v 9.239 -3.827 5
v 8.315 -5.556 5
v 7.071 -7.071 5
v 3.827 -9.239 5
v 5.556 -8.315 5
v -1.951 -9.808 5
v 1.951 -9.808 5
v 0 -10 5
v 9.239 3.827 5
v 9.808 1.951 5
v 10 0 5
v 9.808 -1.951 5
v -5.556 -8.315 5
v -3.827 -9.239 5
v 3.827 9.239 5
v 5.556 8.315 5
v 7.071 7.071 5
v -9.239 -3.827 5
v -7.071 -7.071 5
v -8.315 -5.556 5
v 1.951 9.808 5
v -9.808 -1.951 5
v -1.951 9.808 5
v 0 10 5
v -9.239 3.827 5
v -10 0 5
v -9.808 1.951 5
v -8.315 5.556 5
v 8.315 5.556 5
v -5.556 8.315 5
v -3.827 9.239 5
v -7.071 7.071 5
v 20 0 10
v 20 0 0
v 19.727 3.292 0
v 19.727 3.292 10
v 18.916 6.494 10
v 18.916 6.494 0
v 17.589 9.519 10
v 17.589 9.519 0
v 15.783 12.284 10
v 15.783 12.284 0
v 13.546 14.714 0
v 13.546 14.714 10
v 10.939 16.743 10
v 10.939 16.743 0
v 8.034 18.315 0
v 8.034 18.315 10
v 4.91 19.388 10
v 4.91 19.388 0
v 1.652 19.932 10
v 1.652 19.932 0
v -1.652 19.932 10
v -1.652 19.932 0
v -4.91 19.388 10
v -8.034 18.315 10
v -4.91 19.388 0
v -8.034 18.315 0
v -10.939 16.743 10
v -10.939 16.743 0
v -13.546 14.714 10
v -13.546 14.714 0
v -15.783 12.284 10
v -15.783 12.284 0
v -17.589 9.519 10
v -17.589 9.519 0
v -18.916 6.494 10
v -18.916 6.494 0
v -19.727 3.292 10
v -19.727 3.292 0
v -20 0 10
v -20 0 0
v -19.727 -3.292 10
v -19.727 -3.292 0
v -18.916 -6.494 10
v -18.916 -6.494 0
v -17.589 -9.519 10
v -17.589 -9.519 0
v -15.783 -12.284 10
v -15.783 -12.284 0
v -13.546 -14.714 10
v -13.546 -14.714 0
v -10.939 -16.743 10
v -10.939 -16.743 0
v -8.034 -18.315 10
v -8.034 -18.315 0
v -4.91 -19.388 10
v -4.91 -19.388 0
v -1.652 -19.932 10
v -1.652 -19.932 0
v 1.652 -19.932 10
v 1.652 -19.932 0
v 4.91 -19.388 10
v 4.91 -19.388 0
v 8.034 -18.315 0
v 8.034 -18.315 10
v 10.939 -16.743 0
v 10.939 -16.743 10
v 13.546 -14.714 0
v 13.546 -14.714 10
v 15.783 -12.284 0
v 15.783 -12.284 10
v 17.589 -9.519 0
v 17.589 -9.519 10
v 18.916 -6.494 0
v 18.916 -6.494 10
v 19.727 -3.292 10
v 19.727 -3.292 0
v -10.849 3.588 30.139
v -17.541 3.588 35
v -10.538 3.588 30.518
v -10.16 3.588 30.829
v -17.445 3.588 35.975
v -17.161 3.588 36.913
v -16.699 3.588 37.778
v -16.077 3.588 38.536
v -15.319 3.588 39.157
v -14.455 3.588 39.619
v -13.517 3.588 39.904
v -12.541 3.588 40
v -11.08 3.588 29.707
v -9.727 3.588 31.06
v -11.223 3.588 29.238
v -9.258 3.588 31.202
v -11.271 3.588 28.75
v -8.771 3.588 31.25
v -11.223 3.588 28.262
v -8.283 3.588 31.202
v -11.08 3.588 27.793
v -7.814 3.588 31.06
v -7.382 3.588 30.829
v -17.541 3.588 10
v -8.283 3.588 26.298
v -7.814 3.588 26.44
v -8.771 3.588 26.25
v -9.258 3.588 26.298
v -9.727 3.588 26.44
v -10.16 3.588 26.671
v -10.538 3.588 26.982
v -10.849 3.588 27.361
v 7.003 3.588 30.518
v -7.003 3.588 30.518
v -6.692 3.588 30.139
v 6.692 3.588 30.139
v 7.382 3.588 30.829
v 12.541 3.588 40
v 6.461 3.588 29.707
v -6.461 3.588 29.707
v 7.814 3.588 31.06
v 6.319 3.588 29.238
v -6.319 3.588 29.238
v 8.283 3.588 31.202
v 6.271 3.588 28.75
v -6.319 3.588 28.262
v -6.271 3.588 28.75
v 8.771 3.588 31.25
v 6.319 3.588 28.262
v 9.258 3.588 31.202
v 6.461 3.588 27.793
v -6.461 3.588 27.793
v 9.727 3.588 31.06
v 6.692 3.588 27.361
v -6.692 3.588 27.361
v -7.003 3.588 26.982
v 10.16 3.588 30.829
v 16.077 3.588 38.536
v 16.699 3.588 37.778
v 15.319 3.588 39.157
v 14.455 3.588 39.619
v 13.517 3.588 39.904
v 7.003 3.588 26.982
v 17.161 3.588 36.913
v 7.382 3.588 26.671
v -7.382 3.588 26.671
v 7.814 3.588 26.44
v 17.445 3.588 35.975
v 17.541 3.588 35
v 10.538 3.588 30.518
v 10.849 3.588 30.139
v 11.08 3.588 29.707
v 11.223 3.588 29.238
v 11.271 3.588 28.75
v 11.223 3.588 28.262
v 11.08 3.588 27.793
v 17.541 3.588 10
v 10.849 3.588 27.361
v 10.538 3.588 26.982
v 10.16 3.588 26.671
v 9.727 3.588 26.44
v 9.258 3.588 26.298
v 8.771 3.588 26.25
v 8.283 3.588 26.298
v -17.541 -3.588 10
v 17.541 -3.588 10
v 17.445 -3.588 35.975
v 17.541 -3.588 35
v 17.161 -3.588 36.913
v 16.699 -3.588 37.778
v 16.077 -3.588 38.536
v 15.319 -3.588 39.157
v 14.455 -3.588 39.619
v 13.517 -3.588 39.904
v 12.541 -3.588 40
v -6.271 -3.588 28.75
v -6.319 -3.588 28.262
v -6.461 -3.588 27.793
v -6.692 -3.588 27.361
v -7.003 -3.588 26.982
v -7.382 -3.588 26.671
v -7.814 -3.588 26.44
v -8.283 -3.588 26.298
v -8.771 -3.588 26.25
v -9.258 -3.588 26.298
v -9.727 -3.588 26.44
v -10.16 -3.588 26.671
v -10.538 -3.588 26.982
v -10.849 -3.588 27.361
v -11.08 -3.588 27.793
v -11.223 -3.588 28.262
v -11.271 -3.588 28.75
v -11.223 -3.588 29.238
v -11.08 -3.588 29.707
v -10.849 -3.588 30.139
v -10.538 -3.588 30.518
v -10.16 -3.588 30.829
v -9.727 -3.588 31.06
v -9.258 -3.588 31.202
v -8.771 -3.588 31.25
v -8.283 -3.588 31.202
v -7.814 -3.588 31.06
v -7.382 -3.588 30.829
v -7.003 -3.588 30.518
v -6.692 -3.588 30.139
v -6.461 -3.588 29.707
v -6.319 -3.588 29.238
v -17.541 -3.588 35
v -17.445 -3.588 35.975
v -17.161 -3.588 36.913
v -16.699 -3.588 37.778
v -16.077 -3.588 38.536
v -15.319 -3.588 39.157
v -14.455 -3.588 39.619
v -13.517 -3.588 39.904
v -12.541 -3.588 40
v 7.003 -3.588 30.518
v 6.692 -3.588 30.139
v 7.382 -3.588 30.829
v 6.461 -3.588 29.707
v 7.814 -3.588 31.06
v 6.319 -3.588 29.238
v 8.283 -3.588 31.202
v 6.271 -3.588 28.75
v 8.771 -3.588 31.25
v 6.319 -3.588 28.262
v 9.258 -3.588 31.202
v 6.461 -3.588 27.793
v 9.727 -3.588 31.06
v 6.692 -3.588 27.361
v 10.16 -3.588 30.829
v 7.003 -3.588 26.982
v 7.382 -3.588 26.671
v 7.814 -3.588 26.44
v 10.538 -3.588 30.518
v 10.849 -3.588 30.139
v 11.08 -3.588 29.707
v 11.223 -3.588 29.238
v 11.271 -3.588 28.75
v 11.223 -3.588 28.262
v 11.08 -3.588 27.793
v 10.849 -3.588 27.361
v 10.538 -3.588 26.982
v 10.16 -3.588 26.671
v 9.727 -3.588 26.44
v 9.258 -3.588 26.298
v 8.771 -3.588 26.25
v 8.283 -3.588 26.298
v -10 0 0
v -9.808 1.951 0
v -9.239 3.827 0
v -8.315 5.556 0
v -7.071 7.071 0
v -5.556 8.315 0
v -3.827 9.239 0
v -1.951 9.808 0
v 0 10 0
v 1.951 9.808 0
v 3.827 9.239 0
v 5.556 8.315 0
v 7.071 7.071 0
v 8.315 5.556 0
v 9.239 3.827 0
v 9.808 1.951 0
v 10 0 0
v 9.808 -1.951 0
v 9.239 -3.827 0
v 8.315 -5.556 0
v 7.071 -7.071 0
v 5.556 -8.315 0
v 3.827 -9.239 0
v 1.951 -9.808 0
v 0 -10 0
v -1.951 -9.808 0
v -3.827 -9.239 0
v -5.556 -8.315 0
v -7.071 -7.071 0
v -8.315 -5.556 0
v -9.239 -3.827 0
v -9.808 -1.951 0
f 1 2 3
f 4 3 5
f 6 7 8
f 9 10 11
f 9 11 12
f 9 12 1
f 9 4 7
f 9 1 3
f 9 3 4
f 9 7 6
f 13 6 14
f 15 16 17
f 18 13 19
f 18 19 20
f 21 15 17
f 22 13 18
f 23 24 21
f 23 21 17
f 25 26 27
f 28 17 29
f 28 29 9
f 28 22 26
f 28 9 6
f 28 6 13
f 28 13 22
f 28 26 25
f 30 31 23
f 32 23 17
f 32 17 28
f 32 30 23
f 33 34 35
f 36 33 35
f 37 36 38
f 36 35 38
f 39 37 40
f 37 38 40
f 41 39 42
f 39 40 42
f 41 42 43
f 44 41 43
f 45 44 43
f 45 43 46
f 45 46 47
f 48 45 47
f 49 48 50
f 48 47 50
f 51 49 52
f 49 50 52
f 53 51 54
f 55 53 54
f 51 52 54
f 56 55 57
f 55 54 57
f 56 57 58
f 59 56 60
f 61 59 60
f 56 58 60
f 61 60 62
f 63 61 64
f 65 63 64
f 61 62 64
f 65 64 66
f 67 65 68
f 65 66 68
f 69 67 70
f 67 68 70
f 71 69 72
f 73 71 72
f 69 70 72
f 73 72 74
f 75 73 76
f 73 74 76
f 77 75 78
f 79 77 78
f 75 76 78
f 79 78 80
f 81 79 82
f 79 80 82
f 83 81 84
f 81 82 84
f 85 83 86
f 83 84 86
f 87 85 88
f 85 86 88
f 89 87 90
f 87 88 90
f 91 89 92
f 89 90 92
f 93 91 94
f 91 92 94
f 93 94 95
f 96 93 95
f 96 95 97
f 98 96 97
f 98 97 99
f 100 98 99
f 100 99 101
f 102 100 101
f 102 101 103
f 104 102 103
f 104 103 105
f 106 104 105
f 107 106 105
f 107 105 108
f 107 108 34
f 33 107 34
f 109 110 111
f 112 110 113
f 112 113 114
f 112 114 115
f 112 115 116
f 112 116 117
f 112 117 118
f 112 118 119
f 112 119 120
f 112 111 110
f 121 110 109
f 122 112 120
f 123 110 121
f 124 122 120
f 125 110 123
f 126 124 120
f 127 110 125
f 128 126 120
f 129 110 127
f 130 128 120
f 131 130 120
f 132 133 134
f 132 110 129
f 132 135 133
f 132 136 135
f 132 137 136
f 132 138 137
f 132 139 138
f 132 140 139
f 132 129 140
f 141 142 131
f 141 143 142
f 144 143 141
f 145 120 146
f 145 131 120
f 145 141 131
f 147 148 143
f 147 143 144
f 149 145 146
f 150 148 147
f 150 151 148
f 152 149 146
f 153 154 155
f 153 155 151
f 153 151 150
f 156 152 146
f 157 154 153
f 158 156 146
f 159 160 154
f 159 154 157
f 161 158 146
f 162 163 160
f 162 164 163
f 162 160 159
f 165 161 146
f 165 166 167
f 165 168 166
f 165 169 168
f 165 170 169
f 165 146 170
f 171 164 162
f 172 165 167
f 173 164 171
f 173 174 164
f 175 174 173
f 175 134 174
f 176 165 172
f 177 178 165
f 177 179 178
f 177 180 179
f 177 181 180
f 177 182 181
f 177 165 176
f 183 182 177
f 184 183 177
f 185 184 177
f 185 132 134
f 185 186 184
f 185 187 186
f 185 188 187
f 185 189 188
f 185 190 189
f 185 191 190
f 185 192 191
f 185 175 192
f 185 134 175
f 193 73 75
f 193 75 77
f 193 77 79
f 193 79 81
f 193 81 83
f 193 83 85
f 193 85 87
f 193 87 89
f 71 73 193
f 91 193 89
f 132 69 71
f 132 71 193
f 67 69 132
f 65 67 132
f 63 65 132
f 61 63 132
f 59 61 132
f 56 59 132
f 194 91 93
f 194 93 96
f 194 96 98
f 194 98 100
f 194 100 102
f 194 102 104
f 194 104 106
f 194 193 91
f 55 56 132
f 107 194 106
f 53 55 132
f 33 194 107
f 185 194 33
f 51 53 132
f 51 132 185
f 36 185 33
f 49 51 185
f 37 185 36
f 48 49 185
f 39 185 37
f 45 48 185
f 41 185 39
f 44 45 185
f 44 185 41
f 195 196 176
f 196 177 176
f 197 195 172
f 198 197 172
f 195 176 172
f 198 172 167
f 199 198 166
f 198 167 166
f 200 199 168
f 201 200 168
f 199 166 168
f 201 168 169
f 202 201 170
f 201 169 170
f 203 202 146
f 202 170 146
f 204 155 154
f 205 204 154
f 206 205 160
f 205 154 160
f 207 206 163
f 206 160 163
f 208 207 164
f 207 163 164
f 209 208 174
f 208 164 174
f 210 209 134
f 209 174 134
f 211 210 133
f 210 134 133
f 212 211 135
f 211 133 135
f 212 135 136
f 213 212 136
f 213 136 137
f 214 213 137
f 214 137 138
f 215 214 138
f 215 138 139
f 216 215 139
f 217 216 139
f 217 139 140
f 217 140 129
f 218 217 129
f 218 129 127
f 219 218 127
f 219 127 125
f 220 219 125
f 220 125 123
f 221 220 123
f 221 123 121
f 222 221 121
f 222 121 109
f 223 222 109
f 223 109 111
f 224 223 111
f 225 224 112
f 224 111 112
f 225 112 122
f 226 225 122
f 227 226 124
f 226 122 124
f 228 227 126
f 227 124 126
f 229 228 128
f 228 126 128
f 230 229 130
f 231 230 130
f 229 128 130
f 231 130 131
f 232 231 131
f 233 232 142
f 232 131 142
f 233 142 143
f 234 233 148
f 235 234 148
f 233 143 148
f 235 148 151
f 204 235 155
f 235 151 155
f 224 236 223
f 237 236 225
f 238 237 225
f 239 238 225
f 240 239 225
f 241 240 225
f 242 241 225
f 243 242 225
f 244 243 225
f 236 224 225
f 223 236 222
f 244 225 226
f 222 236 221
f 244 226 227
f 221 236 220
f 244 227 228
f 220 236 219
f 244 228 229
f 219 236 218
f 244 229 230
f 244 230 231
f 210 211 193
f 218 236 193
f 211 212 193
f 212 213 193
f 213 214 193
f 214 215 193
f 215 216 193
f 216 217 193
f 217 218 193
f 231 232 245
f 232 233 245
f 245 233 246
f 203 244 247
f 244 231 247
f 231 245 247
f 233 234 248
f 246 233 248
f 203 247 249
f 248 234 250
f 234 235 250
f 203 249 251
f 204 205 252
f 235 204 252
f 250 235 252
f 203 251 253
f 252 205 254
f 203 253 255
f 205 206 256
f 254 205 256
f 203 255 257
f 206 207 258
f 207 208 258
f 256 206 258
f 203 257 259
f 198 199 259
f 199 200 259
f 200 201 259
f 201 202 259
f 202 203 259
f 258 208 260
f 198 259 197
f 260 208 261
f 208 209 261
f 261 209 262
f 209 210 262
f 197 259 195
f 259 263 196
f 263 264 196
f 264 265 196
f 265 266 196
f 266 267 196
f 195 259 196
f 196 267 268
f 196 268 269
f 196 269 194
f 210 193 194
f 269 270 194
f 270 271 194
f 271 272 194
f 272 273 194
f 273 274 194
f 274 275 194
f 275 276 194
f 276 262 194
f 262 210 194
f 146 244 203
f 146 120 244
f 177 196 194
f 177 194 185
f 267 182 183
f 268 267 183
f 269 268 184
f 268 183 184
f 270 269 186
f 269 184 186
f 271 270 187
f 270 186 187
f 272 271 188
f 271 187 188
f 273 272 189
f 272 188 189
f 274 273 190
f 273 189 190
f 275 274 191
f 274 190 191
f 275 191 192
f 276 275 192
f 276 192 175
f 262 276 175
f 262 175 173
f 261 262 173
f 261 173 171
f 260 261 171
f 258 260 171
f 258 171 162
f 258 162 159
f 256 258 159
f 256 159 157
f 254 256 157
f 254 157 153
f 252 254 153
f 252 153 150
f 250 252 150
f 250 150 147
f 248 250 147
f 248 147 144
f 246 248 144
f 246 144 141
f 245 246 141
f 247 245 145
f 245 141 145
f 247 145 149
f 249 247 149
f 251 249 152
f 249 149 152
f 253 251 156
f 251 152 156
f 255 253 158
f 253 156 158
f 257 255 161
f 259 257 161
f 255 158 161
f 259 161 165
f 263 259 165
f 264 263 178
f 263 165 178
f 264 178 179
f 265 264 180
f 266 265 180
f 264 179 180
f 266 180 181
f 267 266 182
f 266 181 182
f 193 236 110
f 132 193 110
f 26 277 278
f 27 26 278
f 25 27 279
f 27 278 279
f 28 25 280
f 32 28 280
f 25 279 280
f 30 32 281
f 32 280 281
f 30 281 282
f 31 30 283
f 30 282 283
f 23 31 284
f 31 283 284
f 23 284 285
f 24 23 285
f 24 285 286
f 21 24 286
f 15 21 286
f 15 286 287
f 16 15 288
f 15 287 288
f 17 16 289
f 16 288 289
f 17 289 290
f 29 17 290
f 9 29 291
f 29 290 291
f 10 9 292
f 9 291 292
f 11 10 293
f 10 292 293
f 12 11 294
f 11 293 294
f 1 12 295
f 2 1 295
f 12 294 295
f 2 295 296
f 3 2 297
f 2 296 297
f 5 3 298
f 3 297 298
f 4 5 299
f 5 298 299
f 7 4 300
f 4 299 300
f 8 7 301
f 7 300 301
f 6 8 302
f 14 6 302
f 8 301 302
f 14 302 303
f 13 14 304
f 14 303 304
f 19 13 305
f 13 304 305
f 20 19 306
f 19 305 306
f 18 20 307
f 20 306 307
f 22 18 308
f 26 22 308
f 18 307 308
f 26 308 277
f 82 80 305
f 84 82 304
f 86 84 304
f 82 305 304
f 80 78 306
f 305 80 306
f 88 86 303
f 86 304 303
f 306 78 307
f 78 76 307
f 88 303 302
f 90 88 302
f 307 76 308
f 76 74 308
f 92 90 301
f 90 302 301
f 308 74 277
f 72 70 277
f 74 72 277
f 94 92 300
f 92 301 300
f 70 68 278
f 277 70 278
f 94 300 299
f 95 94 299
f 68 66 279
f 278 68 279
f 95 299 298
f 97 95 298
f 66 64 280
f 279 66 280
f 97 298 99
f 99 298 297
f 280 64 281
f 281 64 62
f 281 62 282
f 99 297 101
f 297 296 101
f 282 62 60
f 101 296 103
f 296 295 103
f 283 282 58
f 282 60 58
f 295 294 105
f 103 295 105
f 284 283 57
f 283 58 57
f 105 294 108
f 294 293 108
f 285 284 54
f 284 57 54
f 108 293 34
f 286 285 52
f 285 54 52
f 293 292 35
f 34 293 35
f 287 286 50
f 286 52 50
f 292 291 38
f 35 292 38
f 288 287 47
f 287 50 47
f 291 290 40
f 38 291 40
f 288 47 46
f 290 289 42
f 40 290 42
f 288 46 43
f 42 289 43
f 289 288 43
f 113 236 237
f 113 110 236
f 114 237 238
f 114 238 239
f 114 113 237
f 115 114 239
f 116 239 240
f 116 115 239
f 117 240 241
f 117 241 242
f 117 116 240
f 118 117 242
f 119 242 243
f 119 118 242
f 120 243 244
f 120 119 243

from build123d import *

# Parameters (mm, degrees)
SKETCH1_R           = 20
BOSS_EXTRUDE1_DEPTH = 10
SKETCH2_W           = 35.08265457
SKETCH2_H           = 7.175997526
BOSS_EXTRUDE2_DEPTH = 30
FILLET1_R           = 5
SKETCH3_R           = 2.5
CUT_EXTRUDE1_DEPTH  = 30
SKETCH4_R           = 10
CUT_EXTRUDE2_DEPTH  = 5


with BuildPart() as part:
    # Sketch1 → Boss-Extrude1 (new body)
    with BuildSketch(Plane.XY):
        Circle(SKETCH1_R)
    extrude(amount=BOSS_EXTRUDE1_DEPTH)

    # Sketch2 → Boss-Extrude2 (add)
    with BuildSketch(Plane.XY.offset(10)):
        Rectangle(SKETCH2_W, SKETCH2_H)
    extrude(amount=BOSS_EXTRUDE2_DEPTH)

    # Fillet1
    fillet1_edges = [part.edges().sort_by_distance(p)[0] for p in [
        (17.541327285, 0, 40),
        (-17.541327285, 0, 40),
    ]]
    fillet(fillet1_edges, radius=FILLET1_R)

    # Sketch3 → Cut-Extrude1 (cut)
    with BuildSketch(Plane(origin=(0, 3.587998763, 0), x_dir=(1, 0, 0), z_dir=(0, 1, 0))):
        with Locations((-8.770663642, -28.75)):
            Circle(SKETCH3_R)
        with Locations((8.770663642, -28.75)):
            Circle(SKETCH3_R)
    extrude(amount=-CUT_EXTRUDE1_DEPTH, mode=Mode.SUBTRACT)

    # Sketch4 → Cut-Extrude2 (cut)
    with BuildSketch(Plane(origin=(0, 0, 0), x_dir=(-1, 0, 0), z_dir=(0, 0, -1))):
        Circle(SKETCH4_R)
    extrude(amount=-CUT_EXTRUDE2_DEPTH, mode=Mode.SUBTRACT)


solid = part.part
